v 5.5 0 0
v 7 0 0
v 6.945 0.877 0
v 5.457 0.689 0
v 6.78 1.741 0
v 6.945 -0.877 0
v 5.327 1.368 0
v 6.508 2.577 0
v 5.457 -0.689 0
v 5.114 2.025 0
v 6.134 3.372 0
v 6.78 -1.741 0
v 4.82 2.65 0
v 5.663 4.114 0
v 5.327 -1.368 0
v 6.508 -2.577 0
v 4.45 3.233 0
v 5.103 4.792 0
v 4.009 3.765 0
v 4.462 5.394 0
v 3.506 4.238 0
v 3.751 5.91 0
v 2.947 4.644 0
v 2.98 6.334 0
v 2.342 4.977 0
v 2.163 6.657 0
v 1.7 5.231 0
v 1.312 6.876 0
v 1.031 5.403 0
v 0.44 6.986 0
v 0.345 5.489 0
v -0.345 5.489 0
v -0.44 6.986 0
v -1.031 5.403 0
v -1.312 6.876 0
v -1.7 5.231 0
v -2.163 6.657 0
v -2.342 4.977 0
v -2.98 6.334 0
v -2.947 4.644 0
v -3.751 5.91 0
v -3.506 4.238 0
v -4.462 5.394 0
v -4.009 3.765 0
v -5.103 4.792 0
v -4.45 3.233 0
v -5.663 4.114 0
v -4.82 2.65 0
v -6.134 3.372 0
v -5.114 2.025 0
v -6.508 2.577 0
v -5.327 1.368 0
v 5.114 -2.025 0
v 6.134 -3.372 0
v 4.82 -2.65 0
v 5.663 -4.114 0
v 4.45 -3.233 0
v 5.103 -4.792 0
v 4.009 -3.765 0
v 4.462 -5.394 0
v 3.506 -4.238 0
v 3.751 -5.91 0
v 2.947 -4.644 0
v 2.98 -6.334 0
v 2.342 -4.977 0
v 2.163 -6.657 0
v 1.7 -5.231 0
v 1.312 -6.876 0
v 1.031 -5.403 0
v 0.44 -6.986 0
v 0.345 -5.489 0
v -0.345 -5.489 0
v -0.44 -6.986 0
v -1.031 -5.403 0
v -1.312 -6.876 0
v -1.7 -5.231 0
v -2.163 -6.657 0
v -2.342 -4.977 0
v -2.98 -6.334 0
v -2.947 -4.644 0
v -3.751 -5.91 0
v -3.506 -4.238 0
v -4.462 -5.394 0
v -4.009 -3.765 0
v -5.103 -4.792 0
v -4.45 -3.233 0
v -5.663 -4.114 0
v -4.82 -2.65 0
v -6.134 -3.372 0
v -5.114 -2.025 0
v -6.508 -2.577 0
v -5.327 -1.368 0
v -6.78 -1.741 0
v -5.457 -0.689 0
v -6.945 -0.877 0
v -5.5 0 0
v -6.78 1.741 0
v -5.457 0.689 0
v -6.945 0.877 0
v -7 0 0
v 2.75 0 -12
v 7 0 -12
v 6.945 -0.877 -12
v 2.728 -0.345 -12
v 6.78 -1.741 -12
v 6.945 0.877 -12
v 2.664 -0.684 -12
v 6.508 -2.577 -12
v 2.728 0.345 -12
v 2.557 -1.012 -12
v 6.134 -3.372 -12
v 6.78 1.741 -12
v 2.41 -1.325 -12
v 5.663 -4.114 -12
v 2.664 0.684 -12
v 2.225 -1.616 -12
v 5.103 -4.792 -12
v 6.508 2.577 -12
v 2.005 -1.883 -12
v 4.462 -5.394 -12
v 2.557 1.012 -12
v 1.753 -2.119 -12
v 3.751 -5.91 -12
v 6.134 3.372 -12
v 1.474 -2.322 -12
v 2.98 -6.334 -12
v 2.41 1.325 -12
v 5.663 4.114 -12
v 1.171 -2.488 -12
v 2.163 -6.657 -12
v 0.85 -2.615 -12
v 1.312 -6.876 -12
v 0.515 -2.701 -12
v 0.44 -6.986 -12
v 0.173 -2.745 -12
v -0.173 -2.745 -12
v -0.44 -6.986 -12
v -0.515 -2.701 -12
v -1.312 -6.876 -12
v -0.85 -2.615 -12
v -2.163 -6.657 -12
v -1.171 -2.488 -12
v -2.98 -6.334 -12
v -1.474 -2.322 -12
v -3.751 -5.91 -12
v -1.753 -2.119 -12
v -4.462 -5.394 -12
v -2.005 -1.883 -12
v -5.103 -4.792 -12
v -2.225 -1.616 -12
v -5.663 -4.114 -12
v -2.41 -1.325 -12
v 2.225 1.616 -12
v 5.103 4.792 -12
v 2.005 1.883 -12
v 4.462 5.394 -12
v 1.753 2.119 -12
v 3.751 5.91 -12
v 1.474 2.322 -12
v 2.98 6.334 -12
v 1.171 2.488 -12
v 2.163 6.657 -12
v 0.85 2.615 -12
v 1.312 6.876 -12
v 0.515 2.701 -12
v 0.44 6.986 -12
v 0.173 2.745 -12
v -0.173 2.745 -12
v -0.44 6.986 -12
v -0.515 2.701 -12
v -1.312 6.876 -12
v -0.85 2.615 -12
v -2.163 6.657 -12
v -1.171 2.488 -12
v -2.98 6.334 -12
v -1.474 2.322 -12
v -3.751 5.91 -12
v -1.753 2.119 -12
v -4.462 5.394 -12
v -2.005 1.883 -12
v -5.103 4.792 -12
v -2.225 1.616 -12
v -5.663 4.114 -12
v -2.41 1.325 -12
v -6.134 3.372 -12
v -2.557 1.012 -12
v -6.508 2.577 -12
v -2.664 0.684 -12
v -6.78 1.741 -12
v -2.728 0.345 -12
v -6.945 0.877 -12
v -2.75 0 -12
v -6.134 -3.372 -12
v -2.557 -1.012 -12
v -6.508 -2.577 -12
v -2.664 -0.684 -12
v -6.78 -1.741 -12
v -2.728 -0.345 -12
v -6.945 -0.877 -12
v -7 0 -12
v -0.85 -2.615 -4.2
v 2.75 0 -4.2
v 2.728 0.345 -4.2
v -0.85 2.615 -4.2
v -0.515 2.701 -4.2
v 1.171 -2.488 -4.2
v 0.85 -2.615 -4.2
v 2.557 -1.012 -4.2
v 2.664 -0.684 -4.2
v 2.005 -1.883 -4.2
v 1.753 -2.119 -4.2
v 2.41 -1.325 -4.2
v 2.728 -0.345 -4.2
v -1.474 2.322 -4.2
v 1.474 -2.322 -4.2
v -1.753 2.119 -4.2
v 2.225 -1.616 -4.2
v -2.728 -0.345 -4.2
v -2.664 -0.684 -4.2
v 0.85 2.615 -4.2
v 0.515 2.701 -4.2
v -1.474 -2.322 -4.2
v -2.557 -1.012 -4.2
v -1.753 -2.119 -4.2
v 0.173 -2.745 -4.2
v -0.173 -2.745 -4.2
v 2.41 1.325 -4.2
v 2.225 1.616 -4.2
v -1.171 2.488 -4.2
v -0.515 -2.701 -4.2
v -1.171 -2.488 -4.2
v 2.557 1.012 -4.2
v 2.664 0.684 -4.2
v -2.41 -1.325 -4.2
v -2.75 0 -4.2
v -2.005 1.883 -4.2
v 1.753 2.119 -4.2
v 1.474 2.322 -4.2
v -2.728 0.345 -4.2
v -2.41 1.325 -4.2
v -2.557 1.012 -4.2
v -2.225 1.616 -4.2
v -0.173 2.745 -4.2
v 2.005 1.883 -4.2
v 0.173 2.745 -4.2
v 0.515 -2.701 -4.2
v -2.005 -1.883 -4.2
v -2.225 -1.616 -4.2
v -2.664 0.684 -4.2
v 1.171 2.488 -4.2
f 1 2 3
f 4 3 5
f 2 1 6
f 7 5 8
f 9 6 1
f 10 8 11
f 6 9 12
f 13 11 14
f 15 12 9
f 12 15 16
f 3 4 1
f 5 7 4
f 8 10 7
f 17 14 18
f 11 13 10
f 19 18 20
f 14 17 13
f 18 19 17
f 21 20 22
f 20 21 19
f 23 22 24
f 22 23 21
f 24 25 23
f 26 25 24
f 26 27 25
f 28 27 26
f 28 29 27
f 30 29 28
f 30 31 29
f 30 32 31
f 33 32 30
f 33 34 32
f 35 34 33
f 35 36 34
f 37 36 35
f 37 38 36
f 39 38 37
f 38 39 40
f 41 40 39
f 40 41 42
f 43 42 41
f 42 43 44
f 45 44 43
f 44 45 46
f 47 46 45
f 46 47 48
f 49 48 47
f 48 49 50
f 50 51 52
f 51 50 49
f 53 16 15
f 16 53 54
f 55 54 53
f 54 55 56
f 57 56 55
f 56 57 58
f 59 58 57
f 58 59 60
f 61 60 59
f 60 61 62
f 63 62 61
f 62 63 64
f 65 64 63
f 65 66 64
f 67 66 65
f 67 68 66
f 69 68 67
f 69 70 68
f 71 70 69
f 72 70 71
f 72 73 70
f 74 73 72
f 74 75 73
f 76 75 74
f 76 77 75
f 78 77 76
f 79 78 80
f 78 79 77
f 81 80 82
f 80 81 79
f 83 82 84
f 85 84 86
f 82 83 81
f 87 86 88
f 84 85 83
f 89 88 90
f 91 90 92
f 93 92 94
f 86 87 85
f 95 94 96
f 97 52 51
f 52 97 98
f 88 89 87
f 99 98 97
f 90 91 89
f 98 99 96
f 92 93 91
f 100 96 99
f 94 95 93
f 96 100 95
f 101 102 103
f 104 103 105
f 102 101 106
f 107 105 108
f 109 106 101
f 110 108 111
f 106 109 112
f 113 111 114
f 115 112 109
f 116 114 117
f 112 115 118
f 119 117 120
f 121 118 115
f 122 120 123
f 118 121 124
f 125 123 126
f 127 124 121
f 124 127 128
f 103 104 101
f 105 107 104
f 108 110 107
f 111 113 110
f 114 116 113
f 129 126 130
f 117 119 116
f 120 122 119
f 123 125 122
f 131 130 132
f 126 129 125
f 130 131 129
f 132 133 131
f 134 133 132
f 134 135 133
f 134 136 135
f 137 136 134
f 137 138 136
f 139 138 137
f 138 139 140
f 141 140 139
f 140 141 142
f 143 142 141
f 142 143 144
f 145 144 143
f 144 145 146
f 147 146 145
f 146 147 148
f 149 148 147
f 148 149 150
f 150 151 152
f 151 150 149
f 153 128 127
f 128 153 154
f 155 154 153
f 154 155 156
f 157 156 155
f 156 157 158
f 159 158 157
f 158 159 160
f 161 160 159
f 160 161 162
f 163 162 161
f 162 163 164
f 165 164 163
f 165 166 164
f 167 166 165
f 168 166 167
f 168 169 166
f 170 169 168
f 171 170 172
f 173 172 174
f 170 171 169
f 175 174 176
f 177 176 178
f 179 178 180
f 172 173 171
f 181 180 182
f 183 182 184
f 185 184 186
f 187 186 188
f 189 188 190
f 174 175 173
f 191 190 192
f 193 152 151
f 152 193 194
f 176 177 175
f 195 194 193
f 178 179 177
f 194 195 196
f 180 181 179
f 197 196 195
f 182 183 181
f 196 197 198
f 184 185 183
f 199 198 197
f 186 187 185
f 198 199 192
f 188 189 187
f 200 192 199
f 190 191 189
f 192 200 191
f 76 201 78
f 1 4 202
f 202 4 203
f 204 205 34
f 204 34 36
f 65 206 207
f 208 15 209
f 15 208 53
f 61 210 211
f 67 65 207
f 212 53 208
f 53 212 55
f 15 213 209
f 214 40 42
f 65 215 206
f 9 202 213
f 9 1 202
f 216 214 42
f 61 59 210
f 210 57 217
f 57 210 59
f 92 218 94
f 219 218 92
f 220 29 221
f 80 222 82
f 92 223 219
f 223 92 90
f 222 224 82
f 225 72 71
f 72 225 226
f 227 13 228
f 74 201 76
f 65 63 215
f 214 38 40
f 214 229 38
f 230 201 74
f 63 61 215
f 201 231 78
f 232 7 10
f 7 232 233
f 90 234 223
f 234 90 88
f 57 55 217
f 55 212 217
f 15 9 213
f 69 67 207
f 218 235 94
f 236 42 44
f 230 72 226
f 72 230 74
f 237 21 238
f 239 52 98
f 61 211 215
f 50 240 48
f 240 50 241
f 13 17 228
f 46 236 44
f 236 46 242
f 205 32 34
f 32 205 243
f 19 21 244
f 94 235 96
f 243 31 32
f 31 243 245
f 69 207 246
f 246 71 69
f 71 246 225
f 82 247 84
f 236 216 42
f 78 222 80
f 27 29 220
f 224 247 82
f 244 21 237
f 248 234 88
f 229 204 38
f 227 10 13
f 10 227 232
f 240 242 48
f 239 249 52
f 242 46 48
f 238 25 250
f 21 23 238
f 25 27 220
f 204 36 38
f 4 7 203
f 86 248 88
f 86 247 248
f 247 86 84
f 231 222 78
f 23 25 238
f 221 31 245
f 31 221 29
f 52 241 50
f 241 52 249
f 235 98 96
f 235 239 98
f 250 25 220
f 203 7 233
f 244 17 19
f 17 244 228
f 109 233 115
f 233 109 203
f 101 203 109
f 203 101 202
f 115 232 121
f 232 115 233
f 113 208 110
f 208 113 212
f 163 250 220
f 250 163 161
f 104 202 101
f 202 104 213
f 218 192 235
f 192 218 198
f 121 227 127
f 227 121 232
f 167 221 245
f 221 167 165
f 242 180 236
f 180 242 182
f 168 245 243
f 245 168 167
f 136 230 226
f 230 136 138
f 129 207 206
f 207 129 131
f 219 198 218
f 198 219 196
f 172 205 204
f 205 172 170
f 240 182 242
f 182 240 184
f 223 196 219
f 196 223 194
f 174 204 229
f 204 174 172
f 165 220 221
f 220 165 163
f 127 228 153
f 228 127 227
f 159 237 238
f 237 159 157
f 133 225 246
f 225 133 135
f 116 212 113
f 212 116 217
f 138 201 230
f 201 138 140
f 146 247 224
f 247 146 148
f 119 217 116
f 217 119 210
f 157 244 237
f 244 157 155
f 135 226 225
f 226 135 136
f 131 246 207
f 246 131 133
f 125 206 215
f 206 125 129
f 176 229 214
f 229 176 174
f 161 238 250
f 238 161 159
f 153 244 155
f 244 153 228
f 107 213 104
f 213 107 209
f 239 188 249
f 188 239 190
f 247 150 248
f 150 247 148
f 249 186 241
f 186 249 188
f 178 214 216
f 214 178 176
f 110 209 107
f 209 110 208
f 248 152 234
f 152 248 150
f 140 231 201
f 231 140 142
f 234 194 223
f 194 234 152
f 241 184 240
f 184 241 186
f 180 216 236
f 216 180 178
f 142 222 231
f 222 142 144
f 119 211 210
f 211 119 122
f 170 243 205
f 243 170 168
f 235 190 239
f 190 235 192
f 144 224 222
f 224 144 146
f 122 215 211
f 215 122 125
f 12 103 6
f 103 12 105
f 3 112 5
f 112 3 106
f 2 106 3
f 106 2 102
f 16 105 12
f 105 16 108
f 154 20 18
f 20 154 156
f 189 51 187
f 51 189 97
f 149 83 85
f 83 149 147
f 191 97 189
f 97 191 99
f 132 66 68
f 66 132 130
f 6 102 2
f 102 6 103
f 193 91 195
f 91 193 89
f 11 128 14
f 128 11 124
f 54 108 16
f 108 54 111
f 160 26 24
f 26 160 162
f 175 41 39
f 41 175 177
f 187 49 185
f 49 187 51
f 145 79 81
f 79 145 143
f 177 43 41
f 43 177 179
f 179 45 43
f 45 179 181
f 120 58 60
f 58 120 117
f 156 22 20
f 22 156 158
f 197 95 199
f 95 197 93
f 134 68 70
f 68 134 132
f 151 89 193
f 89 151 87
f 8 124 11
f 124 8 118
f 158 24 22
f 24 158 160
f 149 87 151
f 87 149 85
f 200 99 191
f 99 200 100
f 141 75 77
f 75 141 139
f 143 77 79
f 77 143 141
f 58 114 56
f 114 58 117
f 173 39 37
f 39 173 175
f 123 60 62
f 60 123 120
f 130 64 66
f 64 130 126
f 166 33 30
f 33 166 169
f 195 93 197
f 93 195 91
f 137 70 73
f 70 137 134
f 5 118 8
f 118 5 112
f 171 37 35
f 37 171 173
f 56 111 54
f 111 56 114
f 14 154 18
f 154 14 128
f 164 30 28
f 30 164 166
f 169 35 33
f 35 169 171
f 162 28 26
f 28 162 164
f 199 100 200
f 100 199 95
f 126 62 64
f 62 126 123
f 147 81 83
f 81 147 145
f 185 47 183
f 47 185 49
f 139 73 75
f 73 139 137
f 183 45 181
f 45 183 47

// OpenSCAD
$fn = 50;


difference() {
	union() {
		translate(v = [0, 0, -12.0000000000]) {
			cylinder(h = 12, r = 7.0000000000);
		}
	}
	union() {
		translate(v = [0, 0, 0]) {
			rotate(a = [0, 0, 0]) {
				difference() {
					union() {
						#translate(v = [0, 0, -12.0000000000]) {
							cylinder(h = 12, r = 2.2500000000);
						}
						#translate(v = [0, 0, -4.2000000000]) {
							cylinder(h = 4.2000000000, r = 7.0000000000, r1 = 2.7500000000, r2 = 5.5000000000);
						}
						#translate(v = [0, 0, -12.0000000000]) {
							cylinder(h = 12, r = 2.7500000000);
						}
						#translate(v = [0, 0, -12.0000000000]) {
							cylinder(h = 12, r = 2.2500000000);
						}
					}
					union();
				}
			}
		}
	}
}
